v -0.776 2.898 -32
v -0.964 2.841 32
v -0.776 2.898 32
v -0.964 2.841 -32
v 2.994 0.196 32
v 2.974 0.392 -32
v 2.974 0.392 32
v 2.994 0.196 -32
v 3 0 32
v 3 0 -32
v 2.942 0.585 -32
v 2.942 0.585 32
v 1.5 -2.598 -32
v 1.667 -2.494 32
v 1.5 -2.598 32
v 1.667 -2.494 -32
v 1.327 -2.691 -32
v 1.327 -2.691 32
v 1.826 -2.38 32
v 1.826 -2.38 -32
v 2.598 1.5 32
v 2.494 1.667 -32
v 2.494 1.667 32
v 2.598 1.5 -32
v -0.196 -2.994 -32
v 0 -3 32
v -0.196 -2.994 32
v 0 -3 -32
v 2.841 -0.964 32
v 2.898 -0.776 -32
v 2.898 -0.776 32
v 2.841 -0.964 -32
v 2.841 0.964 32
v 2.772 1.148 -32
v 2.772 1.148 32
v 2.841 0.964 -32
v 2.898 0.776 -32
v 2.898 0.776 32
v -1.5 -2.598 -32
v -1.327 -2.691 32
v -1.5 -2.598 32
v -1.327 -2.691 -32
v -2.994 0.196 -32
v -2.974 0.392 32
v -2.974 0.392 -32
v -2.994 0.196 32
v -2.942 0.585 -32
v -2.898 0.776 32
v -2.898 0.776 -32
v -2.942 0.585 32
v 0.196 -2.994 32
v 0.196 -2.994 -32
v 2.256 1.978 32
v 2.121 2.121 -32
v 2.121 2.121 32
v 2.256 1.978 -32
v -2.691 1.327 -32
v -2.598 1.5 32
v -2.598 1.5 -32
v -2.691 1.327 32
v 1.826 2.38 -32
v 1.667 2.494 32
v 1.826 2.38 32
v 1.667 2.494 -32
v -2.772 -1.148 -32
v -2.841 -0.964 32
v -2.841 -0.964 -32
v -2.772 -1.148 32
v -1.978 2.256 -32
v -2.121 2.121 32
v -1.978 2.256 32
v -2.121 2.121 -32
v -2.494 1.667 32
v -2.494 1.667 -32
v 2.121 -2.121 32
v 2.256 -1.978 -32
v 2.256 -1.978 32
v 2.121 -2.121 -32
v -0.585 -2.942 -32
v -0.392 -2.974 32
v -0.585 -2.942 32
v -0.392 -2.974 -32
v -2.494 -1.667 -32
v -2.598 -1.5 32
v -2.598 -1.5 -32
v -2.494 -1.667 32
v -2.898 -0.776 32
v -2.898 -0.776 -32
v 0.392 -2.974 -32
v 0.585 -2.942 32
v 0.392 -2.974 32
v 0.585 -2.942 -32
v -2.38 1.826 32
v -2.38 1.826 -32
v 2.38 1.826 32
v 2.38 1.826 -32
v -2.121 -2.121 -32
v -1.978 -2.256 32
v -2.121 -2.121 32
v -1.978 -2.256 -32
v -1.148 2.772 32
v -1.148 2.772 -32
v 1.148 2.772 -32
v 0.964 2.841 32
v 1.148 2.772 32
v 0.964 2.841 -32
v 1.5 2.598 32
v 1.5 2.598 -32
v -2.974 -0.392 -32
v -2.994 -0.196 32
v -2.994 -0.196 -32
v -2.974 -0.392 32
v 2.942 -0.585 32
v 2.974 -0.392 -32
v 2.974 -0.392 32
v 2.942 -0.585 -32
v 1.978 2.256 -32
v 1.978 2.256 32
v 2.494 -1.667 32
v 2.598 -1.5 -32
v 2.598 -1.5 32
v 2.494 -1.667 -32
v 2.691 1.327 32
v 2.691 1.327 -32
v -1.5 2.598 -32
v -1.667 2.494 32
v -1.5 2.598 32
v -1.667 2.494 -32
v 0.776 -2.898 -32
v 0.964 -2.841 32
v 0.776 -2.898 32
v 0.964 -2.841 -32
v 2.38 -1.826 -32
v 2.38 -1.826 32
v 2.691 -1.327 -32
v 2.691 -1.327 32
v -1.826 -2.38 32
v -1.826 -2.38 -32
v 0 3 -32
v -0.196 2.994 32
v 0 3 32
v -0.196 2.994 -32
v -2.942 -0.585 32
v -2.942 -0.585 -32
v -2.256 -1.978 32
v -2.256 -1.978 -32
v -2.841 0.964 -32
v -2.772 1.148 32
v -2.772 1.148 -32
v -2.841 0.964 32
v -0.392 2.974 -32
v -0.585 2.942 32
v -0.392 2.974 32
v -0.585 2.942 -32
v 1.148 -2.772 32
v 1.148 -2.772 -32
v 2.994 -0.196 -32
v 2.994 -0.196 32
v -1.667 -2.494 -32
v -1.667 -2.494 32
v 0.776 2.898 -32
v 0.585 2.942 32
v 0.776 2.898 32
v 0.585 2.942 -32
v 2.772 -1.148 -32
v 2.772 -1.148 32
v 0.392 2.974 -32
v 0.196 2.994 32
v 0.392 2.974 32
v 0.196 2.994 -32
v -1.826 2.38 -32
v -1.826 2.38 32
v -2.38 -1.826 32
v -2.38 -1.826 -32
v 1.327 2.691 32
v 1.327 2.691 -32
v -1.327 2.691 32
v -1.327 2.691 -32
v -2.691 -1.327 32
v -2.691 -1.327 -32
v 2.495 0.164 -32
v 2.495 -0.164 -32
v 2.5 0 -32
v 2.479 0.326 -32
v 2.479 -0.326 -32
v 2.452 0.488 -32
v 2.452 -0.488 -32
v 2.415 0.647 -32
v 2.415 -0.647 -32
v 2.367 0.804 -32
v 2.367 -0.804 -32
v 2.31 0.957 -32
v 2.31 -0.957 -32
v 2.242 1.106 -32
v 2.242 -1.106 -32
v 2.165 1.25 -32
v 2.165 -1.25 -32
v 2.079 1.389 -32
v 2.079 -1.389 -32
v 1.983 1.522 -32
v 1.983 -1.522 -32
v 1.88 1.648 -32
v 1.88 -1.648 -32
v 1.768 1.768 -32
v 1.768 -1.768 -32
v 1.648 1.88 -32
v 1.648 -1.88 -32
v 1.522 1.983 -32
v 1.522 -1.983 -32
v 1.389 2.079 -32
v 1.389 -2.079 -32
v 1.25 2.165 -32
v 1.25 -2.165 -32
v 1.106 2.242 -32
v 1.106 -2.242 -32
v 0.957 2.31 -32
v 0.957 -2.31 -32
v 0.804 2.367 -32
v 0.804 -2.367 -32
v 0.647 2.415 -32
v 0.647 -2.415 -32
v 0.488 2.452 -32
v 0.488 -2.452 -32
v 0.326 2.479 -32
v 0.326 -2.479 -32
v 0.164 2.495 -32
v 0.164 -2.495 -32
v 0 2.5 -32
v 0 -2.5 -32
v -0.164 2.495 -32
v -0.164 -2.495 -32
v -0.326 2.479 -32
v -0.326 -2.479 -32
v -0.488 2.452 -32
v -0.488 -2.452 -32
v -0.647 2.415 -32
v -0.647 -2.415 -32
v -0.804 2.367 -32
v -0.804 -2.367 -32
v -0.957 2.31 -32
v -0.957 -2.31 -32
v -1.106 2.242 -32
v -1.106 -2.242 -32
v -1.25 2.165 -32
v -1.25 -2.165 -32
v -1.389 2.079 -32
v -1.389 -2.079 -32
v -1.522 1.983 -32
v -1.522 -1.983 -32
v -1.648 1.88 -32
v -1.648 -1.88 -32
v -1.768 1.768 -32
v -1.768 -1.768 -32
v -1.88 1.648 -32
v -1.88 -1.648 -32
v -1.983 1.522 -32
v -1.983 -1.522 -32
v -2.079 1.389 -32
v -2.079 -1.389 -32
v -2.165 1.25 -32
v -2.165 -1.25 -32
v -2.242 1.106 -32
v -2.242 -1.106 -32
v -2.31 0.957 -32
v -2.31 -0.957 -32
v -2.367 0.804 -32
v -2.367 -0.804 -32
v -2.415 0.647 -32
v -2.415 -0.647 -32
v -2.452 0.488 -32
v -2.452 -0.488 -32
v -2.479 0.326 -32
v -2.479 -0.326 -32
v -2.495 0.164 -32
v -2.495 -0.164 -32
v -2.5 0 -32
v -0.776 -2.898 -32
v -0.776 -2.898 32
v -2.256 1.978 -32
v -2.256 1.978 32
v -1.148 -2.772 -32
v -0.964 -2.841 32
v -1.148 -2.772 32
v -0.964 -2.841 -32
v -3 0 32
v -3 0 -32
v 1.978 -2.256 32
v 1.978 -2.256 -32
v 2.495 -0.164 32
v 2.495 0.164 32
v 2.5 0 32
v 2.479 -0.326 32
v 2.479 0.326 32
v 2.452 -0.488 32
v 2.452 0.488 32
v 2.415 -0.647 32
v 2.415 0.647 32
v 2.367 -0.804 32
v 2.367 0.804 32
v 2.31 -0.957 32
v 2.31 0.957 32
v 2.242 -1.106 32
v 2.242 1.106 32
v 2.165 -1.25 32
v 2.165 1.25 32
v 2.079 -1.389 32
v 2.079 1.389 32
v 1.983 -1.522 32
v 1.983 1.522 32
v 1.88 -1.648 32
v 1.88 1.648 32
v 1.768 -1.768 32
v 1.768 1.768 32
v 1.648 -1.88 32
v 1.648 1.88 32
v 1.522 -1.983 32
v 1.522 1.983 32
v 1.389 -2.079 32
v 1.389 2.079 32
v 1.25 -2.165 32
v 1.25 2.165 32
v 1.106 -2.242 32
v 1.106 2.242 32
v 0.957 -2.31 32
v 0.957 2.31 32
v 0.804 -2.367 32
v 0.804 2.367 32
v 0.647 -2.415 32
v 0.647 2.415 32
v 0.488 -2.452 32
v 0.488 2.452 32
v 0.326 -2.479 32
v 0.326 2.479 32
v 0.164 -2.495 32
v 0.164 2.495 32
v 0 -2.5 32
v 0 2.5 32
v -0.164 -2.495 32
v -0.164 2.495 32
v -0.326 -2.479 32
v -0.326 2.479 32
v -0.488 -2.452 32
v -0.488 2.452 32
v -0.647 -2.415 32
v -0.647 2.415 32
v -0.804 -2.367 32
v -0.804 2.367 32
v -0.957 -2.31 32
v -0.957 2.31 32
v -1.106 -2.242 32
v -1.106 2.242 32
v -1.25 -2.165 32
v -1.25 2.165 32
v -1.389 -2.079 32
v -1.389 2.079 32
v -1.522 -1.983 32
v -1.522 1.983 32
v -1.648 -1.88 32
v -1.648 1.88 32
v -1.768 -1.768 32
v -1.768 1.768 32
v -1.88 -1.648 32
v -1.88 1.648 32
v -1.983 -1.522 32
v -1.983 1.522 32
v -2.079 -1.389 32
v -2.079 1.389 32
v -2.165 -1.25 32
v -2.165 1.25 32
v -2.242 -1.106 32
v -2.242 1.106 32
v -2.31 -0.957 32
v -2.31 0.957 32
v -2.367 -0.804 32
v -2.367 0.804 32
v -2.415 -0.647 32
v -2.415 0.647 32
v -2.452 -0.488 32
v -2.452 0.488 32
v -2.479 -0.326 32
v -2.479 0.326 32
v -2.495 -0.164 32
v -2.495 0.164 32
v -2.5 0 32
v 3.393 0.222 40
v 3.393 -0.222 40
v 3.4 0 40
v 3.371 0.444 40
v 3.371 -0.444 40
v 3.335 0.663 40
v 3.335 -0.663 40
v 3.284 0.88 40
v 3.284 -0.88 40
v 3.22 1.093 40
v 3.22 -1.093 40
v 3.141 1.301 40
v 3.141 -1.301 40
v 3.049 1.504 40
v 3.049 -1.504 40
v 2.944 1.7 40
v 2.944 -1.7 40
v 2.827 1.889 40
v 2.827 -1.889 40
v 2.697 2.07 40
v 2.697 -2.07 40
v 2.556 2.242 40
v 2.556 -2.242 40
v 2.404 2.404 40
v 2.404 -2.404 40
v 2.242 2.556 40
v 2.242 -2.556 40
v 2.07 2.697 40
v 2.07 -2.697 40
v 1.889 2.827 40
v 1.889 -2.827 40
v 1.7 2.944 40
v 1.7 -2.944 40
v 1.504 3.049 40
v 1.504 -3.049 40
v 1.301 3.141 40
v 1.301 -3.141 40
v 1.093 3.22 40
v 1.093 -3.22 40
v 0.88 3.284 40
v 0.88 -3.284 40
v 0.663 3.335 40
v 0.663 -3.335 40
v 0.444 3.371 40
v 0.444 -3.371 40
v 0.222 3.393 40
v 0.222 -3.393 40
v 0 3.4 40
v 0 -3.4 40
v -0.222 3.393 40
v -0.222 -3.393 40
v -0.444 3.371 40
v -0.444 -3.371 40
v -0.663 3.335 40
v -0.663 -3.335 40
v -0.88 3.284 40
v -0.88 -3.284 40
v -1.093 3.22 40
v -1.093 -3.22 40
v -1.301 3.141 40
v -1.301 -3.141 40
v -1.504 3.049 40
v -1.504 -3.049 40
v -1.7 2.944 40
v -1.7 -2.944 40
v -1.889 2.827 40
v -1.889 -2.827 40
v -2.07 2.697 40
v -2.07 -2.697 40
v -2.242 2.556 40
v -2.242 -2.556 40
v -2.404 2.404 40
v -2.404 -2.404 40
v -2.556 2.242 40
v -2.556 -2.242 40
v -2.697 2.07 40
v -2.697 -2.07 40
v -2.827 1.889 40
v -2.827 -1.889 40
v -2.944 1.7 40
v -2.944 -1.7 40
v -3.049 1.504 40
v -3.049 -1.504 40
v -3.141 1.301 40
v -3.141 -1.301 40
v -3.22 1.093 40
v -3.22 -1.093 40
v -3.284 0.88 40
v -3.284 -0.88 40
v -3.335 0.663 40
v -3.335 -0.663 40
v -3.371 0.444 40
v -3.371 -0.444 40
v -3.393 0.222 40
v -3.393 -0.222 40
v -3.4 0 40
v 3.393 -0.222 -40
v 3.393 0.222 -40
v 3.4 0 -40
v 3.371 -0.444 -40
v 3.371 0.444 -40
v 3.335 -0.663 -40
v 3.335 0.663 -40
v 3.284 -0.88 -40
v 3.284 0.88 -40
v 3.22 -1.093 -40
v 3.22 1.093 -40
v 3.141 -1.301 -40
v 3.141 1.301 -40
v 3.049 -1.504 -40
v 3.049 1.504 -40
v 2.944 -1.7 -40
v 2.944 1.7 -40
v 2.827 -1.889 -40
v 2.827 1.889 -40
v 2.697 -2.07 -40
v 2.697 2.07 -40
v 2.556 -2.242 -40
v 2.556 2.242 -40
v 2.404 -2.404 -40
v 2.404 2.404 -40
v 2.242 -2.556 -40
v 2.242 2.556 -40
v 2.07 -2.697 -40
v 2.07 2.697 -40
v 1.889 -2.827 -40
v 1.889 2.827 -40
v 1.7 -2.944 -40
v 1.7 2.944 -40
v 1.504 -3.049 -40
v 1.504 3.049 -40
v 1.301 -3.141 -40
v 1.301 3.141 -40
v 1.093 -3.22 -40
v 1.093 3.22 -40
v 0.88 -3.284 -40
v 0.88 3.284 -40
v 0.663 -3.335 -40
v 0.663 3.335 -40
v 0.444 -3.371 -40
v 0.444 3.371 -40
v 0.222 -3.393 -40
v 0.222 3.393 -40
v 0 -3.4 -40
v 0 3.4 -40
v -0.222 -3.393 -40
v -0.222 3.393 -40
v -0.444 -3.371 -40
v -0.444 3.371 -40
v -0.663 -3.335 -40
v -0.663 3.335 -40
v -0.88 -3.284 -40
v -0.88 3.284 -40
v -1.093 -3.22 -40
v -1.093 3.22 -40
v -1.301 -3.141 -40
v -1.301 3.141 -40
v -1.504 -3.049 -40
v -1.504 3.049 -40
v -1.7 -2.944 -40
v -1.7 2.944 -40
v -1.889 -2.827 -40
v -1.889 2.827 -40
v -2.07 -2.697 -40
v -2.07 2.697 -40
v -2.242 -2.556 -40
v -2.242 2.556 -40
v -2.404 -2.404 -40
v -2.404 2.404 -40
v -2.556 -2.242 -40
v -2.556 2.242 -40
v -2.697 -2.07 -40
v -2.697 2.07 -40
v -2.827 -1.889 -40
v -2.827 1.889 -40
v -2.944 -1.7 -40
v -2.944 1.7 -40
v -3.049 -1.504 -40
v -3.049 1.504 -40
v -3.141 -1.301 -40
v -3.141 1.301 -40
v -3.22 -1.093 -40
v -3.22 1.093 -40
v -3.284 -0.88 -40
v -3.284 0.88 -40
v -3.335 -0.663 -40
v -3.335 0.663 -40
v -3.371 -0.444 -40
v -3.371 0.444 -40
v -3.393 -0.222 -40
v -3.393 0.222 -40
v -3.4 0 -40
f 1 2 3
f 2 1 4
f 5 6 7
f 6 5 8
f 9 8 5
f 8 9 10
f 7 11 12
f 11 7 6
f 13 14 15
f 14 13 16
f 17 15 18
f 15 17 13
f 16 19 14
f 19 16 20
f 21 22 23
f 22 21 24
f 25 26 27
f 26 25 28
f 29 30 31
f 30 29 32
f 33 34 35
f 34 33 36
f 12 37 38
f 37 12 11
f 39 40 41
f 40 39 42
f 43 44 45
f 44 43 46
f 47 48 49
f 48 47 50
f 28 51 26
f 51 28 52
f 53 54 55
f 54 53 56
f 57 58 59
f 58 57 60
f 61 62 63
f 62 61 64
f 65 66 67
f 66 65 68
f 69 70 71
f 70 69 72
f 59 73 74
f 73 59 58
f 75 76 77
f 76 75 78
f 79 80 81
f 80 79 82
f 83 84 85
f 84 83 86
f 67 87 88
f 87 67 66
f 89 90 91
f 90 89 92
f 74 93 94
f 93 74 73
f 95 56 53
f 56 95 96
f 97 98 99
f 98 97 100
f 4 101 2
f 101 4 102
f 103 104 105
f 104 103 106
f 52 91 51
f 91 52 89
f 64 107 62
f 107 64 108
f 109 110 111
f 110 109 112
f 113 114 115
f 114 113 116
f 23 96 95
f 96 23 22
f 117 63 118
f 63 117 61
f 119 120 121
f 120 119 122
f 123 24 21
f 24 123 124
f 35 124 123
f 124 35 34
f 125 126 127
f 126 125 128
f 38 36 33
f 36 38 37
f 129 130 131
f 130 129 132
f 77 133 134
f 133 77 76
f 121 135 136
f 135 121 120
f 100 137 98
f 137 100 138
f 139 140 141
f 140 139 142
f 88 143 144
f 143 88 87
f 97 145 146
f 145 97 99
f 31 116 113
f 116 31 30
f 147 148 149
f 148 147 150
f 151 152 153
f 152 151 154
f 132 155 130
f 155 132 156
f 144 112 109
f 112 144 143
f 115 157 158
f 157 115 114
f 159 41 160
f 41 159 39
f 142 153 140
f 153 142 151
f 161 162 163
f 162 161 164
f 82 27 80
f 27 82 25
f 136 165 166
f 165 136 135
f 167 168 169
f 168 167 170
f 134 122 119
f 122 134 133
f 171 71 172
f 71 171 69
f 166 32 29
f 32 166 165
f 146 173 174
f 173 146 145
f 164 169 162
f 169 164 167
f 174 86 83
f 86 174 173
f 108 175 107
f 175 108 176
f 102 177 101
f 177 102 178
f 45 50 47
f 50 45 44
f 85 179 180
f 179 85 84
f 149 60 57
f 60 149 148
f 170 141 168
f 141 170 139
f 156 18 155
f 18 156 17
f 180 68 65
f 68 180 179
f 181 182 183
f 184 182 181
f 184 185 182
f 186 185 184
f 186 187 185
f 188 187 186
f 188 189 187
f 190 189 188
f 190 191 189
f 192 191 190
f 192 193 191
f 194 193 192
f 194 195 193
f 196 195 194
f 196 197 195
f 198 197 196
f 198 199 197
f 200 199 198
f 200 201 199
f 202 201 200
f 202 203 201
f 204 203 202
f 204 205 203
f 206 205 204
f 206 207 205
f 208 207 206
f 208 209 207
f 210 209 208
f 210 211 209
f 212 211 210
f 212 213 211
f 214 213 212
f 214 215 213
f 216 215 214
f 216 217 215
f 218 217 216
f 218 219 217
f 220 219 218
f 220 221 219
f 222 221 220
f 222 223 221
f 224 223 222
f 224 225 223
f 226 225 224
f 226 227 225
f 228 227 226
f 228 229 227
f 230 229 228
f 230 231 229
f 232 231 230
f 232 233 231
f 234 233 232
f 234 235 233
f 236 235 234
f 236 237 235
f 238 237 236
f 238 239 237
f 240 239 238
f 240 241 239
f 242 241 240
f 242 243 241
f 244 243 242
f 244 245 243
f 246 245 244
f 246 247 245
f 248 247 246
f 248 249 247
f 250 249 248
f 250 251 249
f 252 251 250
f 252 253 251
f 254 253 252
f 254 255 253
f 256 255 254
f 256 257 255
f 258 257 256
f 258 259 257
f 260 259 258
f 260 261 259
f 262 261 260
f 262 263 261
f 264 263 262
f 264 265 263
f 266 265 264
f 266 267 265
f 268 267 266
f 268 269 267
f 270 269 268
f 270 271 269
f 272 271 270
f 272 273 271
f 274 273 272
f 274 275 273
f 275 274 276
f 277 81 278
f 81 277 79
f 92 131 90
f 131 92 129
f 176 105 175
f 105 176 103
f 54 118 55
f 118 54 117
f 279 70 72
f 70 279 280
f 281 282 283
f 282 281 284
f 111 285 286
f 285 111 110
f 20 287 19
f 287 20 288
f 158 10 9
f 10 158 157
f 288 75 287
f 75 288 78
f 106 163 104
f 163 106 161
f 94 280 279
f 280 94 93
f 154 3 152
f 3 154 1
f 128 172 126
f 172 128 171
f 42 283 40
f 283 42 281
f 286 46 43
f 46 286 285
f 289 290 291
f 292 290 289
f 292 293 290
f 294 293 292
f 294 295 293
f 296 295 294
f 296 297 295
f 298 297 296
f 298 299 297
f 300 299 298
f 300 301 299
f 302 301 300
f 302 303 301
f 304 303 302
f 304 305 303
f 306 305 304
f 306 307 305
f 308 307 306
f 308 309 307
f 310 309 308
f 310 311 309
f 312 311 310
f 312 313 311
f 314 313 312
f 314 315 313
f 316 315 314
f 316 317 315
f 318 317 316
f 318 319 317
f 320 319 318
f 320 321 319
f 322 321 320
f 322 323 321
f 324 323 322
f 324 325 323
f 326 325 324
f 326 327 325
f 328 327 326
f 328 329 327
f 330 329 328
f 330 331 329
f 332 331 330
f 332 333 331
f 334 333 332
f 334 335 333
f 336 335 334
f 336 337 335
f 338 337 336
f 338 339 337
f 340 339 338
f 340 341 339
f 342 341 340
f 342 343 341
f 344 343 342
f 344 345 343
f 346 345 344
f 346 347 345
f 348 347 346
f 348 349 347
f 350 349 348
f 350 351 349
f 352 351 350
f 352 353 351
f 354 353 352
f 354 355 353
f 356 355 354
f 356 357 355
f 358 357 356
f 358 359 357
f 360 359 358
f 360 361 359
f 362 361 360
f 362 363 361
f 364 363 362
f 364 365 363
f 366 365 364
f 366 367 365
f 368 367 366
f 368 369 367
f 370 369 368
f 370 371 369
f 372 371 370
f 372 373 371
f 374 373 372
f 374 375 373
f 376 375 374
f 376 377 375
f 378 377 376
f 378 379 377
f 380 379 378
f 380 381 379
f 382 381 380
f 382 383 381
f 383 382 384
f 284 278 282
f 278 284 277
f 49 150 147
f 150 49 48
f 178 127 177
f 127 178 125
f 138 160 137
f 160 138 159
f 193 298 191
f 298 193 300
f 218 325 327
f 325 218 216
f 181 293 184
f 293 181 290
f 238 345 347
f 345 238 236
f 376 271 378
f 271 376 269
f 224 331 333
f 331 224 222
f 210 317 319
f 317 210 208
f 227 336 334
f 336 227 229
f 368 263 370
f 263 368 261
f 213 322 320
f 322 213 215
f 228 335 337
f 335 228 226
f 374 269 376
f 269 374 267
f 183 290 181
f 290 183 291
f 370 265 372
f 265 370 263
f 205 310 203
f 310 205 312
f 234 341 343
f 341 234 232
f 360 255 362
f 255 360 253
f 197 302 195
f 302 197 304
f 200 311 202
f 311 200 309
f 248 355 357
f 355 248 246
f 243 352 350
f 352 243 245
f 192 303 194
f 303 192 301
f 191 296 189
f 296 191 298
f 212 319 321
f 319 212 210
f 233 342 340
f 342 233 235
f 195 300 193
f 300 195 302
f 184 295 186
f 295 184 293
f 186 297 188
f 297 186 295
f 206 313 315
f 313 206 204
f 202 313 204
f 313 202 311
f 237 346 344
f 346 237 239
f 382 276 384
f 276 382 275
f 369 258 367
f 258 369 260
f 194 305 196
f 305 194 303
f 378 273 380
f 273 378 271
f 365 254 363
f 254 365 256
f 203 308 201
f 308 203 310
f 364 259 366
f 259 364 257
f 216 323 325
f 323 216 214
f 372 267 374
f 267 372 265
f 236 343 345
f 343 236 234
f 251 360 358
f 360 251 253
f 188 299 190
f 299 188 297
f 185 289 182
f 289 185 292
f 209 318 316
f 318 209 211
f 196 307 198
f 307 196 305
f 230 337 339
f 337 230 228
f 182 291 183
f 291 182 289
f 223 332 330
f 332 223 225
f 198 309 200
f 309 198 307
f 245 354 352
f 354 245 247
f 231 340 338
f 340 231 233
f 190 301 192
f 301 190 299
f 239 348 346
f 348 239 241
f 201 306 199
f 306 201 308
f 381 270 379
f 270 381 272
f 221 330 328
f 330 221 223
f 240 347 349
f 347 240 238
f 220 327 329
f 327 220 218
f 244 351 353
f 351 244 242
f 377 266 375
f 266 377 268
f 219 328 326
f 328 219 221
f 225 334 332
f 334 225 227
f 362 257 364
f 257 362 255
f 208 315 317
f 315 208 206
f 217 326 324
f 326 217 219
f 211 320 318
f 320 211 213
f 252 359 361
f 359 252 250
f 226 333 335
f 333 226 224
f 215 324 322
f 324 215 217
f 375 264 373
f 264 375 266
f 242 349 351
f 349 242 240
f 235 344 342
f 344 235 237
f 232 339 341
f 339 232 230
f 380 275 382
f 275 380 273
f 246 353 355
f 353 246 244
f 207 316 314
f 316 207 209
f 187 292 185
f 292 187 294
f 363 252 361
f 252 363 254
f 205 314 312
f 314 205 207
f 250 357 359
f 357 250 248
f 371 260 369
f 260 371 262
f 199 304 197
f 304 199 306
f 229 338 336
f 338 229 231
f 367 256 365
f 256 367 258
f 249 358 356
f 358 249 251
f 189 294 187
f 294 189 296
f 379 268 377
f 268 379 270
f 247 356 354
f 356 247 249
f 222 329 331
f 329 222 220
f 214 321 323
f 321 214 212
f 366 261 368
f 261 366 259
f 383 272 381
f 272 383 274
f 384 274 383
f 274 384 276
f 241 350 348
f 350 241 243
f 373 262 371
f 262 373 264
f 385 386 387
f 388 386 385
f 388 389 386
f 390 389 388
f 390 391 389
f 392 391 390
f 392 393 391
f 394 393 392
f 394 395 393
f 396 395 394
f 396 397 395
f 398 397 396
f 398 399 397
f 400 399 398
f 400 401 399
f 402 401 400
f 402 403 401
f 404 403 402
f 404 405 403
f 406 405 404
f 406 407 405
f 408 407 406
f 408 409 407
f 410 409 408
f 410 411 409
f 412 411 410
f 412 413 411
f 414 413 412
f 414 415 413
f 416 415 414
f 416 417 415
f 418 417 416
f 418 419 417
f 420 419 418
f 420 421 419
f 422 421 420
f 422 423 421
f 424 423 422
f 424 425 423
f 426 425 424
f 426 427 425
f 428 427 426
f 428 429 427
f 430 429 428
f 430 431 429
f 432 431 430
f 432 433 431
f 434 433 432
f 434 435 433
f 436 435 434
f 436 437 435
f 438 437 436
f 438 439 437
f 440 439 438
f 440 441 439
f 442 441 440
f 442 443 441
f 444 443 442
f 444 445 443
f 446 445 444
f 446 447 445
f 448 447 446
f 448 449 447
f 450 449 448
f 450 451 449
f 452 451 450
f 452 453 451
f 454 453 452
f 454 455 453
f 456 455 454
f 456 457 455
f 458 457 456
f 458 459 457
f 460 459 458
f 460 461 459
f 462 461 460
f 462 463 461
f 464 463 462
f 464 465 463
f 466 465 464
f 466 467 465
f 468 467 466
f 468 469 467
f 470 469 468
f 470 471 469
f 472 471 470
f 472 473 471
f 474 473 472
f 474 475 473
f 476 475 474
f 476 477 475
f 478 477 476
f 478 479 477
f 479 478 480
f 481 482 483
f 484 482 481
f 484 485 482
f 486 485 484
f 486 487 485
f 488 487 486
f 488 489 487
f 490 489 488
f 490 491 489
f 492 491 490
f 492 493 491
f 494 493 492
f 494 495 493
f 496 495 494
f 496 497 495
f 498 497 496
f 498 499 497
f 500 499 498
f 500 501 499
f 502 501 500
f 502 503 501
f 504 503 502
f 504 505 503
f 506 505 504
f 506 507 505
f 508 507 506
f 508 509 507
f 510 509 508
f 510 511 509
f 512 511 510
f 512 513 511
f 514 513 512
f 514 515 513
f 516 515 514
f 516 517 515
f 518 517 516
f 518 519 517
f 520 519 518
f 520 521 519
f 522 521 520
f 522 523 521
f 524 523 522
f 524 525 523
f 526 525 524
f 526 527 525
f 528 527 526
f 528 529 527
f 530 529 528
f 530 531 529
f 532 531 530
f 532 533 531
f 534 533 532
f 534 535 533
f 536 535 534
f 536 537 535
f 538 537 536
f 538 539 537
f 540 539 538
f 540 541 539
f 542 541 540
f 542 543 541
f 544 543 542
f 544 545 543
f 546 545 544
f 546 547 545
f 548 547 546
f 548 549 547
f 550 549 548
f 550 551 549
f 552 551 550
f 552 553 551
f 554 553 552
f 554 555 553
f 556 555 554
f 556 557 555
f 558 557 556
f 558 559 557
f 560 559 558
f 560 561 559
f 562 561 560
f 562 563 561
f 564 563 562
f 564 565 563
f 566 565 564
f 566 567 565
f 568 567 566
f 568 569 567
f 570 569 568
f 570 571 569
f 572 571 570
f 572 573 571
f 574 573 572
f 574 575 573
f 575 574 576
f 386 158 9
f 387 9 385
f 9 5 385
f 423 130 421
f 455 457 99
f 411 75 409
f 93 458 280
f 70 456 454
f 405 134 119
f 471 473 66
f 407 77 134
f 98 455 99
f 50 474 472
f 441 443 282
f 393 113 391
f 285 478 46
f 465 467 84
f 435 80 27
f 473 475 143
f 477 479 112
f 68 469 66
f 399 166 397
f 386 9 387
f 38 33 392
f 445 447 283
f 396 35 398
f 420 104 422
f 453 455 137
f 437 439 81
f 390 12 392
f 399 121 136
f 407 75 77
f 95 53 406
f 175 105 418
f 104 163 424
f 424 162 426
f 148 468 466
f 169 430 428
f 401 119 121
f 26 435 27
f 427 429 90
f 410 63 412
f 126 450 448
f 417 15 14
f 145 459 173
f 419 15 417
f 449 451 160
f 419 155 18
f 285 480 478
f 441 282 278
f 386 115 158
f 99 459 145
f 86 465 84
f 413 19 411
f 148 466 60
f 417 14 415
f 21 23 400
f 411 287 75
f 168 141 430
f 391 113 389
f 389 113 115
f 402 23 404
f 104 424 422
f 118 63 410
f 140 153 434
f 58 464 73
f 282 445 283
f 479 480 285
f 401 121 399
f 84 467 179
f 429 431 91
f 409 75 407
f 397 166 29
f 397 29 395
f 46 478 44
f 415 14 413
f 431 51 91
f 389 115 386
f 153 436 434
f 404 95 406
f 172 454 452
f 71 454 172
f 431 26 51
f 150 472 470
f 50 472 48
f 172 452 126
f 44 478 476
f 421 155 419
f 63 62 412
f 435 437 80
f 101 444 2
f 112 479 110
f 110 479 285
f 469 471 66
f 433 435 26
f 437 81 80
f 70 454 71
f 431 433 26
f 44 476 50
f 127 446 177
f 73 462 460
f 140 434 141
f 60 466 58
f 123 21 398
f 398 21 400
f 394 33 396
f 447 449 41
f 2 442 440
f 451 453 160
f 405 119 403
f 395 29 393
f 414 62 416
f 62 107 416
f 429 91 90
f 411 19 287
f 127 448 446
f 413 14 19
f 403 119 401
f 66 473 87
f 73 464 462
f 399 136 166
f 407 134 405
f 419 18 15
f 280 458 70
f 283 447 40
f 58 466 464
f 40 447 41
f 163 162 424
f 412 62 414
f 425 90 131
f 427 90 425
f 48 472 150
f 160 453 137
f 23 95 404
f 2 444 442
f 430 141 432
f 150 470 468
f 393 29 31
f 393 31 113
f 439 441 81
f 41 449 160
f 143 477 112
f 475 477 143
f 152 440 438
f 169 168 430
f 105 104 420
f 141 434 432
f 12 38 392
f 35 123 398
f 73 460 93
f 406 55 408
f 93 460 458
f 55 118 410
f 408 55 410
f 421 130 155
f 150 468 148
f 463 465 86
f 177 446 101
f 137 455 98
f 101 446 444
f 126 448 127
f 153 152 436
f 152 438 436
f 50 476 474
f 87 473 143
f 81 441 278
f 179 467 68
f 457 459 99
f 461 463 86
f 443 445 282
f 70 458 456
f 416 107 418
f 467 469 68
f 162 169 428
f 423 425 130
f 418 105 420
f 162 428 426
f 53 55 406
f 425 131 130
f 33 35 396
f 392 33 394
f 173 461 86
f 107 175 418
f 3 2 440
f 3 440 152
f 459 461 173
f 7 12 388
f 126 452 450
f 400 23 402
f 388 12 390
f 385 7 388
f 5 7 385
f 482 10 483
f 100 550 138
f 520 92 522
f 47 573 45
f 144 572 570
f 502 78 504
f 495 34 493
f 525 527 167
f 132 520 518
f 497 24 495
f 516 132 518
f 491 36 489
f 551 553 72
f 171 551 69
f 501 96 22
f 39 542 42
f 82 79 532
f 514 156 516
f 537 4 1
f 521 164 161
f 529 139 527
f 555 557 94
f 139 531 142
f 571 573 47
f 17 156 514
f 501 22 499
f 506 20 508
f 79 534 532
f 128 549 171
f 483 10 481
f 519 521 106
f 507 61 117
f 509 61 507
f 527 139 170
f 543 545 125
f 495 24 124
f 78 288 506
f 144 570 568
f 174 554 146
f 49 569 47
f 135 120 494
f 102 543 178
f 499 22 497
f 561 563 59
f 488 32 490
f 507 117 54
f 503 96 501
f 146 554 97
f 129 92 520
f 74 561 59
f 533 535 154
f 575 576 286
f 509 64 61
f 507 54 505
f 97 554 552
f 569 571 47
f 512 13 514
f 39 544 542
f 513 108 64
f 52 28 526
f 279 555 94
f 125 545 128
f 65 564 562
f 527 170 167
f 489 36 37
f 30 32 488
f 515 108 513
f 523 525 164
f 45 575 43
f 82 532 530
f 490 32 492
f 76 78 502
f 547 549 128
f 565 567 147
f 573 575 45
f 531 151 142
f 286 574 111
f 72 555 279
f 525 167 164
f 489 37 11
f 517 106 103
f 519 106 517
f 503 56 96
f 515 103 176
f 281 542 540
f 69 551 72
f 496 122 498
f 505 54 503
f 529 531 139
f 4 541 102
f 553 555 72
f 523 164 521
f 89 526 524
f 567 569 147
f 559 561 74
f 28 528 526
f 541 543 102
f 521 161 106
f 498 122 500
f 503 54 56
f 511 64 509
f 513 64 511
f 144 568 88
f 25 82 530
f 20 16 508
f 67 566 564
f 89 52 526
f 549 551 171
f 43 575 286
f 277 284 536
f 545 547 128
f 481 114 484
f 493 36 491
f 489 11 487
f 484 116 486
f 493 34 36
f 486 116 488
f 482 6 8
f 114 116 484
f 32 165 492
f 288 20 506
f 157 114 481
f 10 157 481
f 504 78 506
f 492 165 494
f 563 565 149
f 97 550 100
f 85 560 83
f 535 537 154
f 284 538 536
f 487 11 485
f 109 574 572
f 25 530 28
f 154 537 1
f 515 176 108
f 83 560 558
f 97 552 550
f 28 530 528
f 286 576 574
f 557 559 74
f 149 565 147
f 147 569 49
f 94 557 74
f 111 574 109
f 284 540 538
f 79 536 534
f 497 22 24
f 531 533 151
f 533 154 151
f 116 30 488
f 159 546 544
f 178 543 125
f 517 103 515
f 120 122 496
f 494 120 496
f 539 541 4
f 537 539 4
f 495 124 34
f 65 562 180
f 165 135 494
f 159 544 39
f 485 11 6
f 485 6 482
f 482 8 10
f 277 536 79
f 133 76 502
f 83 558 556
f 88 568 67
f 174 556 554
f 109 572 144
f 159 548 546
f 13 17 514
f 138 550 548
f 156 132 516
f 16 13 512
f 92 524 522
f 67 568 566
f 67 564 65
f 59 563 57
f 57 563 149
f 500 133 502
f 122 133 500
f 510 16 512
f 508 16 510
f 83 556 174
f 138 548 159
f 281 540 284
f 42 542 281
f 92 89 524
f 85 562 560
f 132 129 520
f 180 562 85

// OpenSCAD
$fn=96;

module tube(od=6, id=4, h=50, center=true){
    difference(){
        cylinder(d=od, h=h, center=center);
        cylinder(d=id, h=h+0.2, center=center);
    }
}

module heatshrink_sleeve(len=60, od=6, wall=0.5, flare_len=6, flare_extra=0.6){
    id = od - 2*wall;
    union(){
        tube(od=od, id=id, h=len-2*flare_len, center=true);
        translate([0,0,(len-2*flare_len)/2])
            cylinder(h=flare_len, d1=od, d2=od+flare_extra, center=false);
        translate([0,0,-(len-2*flare_len)/2 - flare_len])
            cylinder(h=flare_len, d1=od+flare_extra, d2=od, center=false);
        difference(){
            translate([0,0,(len-2*flare_len)/2])
                cylinder(h=flare_len, d1=id, d2=id+flare_extra, center=false);
            translate([0,0,(len-2*flare_len)/2])
                cylinder(h=flare_len+0.2, d1=id-0.01, d2=id+flare_extra-0.01, center=false);
        }
        difference(){
            translate([0,0,-(len-2*flare_len)/2 - flare_len])
                cylinder(h=flare_len, d1=id+flare_extra, d2=id, center=false);
            translate([0,0,-(len-2*flare_len)/2 - flare_len])
                cylinder(h=flare_len+0.2, d1=id+flare_extra-0.01, d2=id-0.01, center=false);
        }
    }
}

heatshrink_sleeve(len=80, od=6, wall=0.5, flare_len=8, flare_extra=0.8);
